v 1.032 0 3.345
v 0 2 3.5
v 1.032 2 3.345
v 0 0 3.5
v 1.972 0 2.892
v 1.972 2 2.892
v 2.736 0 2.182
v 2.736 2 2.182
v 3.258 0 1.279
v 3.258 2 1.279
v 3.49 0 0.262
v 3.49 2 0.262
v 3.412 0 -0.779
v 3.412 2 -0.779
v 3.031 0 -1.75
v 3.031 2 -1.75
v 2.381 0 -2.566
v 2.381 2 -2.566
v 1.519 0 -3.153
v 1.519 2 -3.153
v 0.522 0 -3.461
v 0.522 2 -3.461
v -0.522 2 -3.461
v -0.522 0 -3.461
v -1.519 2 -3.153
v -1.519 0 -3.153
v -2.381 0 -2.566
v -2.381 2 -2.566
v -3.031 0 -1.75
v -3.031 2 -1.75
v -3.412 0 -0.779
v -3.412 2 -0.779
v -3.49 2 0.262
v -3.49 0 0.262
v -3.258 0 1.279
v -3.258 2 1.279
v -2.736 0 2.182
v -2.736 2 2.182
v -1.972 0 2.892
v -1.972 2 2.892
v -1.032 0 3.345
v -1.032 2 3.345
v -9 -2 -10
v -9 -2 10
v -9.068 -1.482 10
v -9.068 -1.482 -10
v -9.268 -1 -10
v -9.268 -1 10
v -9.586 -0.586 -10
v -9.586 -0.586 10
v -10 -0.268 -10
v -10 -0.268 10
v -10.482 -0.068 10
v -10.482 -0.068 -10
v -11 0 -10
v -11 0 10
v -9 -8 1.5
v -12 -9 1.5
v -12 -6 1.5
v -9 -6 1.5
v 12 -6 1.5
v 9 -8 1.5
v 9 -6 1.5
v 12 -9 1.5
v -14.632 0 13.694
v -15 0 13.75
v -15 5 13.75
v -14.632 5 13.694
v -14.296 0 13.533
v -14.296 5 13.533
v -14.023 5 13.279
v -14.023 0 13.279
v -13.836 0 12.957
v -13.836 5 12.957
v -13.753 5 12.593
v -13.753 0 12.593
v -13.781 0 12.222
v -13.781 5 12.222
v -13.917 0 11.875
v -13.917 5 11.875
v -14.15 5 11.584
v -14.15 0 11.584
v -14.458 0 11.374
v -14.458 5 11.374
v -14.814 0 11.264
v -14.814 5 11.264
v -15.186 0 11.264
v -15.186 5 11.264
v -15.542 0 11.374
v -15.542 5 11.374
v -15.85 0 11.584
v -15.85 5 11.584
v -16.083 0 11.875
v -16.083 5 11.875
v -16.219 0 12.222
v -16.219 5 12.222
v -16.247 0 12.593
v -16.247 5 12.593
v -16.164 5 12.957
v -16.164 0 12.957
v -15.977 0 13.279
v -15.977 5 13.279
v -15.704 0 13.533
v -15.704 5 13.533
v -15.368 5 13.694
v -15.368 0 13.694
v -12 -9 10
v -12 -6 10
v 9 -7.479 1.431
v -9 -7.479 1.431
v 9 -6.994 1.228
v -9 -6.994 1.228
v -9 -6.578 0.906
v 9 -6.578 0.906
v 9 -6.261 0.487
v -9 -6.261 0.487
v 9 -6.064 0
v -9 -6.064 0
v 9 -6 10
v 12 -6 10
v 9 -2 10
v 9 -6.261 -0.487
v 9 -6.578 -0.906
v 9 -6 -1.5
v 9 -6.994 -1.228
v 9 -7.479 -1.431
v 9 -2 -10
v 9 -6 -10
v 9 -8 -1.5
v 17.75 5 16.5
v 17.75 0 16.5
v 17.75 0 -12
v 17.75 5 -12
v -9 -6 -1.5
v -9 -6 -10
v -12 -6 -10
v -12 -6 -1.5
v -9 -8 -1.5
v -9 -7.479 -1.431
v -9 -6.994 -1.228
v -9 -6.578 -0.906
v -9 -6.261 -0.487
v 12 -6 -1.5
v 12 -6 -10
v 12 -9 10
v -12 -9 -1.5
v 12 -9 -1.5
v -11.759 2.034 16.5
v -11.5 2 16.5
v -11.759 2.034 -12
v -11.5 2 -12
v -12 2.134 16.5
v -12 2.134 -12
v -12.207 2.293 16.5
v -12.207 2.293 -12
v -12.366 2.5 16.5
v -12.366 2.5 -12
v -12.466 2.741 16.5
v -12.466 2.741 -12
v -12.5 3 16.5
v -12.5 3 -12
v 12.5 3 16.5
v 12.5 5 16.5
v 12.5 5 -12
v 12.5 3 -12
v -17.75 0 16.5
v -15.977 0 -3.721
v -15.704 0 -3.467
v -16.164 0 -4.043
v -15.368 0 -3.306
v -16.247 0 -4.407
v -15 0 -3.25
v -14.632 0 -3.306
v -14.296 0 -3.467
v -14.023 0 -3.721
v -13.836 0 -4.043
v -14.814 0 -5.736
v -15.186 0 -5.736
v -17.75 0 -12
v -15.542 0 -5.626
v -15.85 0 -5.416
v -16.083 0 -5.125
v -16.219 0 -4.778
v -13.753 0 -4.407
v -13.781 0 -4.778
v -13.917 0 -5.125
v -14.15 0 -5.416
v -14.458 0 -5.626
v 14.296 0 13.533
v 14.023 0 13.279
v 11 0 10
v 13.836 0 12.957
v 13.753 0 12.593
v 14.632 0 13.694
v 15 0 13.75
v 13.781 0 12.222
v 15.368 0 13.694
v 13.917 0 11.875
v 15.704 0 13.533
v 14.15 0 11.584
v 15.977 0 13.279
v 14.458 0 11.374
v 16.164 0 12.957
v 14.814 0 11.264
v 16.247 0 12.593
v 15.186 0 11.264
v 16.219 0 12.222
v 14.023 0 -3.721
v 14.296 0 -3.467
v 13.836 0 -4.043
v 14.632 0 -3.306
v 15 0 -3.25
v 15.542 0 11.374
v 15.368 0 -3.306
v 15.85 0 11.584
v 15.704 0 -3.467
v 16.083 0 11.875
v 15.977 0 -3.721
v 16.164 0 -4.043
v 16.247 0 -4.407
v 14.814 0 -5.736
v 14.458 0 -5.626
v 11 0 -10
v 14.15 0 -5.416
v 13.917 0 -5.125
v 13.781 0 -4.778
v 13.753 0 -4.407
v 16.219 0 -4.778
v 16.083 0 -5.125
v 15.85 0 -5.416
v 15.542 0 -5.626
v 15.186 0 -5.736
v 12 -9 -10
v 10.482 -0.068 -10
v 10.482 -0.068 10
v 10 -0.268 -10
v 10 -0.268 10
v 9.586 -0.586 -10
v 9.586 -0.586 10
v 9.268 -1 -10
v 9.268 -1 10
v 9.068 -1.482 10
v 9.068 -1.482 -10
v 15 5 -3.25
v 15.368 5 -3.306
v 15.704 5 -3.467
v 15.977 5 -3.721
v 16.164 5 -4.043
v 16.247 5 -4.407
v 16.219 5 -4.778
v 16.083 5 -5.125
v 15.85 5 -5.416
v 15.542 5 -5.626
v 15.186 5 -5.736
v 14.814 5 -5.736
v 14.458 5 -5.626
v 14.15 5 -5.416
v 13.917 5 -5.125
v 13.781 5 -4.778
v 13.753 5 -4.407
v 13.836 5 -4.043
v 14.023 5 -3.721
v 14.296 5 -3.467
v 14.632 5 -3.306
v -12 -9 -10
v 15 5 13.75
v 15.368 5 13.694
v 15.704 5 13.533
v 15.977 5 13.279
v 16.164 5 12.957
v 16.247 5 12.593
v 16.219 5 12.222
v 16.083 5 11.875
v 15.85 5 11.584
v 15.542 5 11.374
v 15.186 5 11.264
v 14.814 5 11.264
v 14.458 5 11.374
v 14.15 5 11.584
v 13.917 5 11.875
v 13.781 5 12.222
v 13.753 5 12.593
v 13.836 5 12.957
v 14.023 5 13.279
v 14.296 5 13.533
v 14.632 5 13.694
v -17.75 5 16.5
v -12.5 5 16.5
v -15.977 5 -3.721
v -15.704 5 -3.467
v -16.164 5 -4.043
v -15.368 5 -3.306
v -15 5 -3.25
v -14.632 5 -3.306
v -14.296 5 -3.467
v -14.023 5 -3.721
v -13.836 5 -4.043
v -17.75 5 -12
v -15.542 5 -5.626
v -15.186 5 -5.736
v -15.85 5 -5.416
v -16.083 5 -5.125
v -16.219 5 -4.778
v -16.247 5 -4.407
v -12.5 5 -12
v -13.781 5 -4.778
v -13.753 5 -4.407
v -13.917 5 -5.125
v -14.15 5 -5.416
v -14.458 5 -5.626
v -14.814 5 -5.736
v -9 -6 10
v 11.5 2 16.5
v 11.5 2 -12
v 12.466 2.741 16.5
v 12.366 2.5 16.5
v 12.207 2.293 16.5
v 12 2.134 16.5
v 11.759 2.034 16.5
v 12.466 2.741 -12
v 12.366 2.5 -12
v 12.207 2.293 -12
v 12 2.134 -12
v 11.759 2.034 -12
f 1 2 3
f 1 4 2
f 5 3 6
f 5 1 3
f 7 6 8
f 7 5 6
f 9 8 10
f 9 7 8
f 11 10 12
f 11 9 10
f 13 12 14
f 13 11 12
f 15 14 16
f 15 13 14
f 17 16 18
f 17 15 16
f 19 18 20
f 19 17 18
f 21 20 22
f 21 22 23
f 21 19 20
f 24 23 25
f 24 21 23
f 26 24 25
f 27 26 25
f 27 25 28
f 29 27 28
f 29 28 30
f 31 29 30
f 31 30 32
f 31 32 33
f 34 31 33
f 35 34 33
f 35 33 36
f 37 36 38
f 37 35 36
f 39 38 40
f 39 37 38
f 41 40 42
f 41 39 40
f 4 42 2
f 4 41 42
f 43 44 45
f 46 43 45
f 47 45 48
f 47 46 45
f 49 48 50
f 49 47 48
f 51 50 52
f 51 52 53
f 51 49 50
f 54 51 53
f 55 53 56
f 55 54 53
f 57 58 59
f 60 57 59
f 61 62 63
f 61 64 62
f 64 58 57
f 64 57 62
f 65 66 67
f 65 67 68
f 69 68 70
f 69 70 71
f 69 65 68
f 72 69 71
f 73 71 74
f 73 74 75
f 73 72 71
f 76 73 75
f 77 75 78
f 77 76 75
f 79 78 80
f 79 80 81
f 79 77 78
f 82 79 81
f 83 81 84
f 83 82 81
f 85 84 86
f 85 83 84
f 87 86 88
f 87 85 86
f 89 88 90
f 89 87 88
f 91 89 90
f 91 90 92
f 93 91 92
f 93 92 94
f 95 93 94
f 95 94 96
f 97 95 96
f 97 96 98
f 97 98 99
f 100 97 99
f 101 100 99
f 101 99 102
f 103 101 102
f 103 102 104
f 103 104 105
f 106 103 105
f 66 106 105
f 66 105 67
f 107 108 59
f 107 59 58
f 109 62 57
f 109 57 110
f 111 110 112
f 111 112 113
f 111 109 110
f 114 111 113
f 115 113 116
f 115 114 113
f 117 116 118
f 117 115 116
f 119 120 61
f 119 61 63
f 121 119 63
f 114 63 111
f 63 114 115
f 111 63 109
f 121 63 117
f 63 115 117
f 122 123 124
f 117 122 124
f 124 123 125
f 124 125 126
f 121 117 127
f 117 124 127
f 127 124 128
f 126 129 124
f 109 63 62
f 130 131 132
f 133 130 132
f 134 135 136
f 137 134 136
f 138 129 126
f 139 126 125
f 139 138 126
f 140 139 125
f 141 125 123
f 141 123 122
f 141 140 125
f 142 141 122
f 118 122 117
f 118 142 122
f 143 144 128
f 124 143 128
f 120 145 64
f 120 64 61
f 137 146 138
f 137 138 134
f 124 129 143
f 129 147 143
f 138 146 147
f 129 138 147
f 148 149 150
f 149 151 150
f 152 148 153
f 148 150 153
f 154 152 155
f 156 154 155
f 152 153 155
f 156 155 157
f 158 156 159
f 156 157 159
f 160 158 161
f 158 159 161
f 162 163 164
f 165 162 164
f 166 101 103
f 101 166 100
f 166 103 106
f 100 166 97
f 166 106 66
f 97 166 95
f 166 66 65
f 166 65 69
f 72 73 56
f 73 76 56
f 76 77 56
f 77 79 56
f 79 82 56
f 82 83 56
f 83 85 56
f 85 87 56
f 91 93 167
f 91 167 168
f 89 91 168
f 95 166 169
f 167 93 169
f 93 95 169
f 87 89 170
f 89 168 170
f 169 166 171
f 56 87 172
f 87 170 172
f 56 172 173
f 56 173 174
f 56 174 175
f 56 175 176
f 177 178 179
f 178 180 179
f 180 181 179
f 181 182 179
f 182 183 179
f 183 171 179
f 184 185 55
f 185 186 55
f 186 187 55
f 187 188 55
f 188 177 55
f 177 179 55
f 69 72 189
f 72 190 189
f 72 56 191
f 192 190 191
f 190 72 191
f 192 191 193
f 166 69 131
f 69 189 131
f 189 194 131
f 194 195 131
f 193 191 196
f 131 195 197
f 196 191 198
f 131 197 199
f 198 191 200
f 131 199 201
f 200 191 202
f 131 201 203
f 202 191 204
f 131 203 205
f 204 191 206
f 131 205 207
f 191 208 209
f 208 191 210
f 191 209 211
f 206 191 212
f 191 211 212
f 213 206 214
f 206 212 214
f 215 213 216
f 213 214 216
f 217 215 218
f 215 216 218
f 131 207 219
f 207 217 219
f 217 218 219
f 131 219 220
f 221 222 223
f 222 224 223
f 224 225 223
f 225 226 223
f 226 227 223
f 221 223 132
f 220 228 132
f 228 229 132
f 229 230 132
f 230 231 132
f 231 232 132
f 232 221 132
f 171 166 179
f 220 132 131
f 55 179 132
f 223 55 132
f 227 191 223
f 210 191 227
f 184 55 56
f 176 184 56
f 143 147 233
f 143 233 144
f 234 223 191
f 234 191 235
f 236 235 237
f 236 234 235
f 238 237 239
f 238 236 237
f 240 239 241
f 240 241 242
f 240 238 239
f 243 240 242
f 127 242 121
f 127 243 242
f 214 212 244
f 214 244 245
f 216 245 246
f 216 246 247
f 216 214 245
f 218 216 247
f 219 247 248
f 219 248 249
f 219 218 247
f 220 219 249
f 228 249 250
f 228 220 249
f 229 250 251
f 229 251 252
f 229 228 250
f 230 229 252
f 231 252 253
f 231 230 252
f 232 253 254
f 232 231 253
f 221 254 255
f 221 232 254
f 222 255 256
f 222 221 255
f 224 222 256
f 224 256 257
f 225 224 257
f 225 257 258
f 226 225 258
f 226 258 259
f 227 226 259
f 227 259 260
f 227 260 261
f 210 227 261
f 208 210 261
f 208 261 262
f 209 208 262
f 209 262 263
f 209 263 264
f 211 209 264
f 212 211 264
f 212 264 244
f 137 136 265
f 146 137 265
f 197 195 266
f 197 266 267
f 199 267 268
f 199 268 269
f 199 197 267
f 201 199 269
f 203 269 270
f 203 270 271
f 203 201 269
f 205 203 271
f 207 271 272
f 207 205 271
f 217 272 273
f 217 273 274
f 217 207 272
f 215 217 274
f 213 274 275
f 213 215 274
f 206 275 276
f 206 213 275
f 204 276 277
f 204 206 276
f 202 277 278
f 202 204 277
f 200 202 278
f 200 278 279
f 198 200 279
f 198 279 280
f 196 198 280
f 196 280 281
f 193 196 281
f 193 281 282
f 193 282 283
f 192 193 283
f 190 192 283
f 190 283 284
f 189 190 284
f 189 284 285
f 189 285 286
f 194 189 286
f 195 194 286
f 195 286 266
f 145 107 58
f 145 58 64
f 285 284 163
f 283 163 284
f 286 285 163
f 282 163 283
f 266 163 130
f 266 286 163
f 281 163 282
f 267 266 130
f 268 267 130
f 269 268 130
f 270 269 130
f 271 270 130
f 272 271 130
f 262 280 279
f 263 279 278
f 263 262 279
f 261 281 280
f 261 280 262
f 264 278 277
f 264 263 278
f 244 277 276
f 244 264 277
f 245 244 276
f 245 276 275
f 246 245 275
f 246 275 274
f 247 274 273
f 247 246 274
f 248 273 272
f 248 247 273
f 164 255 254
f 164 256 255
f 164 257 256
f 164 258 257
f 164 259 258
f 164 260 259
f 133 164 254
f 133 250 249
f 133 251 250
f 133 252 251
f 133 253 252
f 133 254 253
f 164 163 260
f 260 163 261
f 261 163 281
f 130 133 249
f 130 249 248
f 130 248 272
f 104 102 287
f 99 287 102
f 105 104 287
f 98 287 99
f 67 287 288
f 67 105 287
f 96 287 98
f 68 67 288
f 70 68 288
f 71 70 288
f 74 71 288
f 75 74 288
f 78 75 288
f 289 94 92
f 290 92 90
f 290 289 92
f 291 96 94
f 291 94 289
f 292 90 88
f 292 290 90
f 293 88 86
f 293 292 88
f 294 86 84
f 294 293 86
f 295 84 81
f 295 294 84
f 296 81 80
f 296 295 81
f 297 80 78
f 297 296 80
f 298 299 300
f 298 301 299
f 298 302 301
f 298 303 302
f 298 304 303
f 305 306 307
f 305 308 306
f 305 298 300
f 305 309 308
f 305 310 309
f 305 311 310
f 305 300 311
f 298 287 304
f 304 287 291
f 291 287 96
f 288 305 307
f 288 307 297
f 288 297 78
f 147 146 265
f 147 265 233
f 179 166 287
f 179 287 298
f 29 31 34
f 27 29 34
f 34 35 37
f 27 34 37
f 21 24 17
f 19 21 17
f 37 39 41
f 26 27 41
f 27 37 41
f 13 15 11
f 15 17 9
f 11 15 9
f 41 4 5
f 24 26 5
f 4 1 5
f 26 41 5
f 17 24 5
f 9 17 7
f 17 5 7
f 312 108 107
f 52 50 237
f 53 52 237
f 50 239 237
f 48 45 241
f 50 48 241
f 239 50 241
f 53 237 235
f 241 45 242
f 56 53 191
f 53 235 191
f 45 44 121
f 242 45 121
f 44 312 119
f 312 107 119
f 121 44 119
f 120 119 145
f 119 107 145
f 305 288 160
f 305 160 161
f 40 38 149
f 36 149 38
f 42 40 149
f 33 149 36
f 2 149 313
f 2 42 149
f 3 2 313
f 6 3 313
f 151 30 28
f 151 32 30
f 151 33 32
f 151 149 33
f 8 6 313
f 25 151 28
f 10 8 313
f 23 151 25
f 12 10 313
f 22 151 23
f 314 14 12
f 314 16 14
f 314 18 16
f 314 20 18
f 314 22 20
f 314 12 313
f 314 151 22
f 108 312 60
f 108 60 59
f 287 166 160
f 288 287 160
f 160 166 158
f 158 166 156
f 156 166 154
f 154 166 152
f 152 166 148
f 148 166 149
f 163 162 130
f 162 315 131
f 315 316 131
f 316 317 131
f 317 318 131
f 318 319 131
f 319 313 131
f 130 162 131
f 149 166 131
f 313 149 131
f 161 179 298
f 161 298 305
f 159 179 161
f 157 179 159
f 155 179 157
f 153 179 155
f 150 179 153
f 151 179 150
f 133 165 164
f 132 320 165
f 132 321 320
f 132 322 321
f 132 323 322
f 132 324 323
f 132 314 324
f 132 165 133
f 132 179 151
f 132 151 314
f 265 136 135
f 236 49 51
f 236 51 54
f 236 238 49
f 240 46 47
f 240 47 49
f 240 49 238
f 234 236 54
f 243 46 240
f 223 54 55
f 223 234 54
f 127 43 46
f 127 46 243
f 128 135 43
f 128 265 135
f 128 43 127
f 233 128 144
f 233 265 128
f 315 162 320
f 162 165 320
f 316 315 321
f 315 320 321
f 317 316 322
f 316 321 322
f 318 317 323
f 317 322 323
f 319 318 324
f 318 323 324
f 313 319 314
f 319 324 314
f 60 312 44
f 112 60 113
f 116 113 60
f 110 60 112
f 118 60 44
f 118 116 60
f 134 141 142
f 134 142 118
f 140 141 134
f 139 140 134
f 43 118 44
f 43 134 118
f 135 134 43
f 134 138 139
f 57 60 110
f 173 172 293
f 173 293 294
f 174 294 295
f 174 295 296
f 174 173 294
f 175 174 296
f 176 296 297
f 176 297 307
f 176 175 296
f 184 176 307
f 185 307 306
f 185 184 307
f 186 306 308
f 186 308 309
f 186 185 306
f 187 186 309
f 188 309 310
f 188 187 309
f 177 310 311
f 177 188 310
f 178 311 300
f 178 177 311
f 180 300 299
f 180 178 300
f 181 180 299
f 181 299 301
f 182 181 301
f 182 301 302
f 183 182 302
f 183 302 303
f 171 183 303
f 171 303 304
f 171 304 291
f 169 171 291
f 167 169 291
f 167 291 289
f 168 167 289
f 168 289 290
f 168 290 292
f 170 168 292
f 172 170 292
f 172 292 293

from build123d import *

# Parameters (mm, degrees)
SKETCH1_W               = 35.5
SKETCH1_H               = 28.5
SKETCH1_R               = 1.25
BOSS_EXTRUDE1_DEPTH     = 5
SKETCH2_W               = 25
SKETCH2_H               = 28.5
SKETCH2_R               = 3.5
CUT_EXTRUDE1_DEPTH      = 3
CUT_EXTRUDE2_DEPTH      = 25.74494898
CUT_EXTRUDE2_DEPTH_BACK = 25.74494898
SKETCH3_R               = 3.5
FILLET1_R               = 1
SKETCH4_W               = 30
SKETCH4_H               = 20
BOSS_EXTRUDE5_DEPTH     = 9
CUT_EXTRUDE7_DEPTH      = 34.14079812
CUT_EXTRUDE7_DEPTH_BACK = 34.14079812
CUT_EXTRUDE8_DEPTH      = 36.189664676
CUT_EXTRUDE8_DEPTH_BACK = 36.189664676
SKETCH8_W               = 3
SKETCH8_H               = 3
FILLET2_R               = 2


with BuildPart() as part:
    # Sketch1 → Boss-Extrude1 (new body)
    with BuildSketch(Plane(origin=(0, 0, 0), x_dir=(1, 0, 0), z_dir=(0, 1, 0))):
        with Locations((0, -2.25)):
            Rectangle(SKETCH1_W, SKETCH1_H)
        with Locations(Location((-15, 4.5, 0), (0, 0, 270))):
            Circle(SKETCH1_R, mode=Mode.SUBTRACT)
        with Locations(Location((15, 4.5, 0), (0, 0, 270))):
            Circle(SKETCH1_R, mode=Mode.SUBTRACT)
        with Locations(Location((-15, -12.5, 0), (0, 0, 270))):
            Circle(SKETCH1_R, mode=Mode.SUBTRACT)
        with Locations(Location((15, -12.5, 0), (0, 0, 270))):
            Circle(SKETCH1_R, mode=Mode.SUBTRACT)
    extrude(amount=BOSS_EXTRUDE1_DEPTH)

    # Sketch2 → Cut-Extrude1 (cut)
    with BuildSketch(Plane(origin=(0, 5, 0), x_dir=(1, 0, 0), z_dir=(0, 1, 0))):
        with Locations((0, -2.25)):
            Rectangle(SKETCH2_W, SKETCH2_H)
        with Locations(Location((0, 0, 0), (0, 0, 270))):
            Circle(SKETCH2_R, mode=Mode.SUBTRACT)
    extrude(amount=-CUT_EXTRUDE1_DEPTH, mode=Mode.SUBTRACT)

    # Sketch3 → Cut-Extrude2 (cut, two sides: drawn at the far end of the back side and taken through both)
    with BuildSketch(Plane(origin=(0, 5, 0), x_dir=(1, 0, 0), z_dir=(0, 1, 0)).offset(-CUT_EXTRUDE2_DEPTH_BACK)):
        with Locations(Location((0, 0, 0), (0, 0, 270))):
            Circle(SKETCH3_R)
    extrude(amount=CUT_EXTRUDE2_DEPTH + CUT_EXTRUDE2_DEPTH_BACK, mode=Mode.SUBTRACT)

    # Fillet1
    fillet1_edges = [part.edges().sort_by_distance(p)[0] for p in [
        (12.5, 2, 2.25),
        (-12.5, 2, 2.25),
    ]]
    fillet(fillet1_edges, radius=FILLET1_R)

    # Sketch4 → Boss-Extrude5 (add)
    with BuildSketch(Plane.XZ):
        Rectangle(SKETCH4_W, SKETCH4_H)
    extrude(amount=BOSS_EXTRUDE5_DEPTH)

    # Sketch7 → Cut-Extrude7 (cut, two sides: drawn at the far end of the back side and taken through both)
    with BuildSketch(Plane(origin=(0, 0, -10), x_dir=(-1, 0, 0), z_dir=(0, 0, -1)).offset(-CUT_EXTRUDE7_DEPTH_BACK)):
        Polygon((12, -6), (12, -9), (15, -9), (15, 0), (9, 0), (9, -6), align=None)
        Polygon((-15, -9), (-12, -9), (-12, -6), (-9, -6), (-9, 0), (-15, 0), align=None)
    extrude(amount=CUT_EXTRUDE7_DEPTH + CUT_EXTRUDE7_DEPTH_BACK, mode=Mode.SUBTRACT)

    # Sketch8 → Cut-Extrude8 (cut, two sides: drawn at the far end of the back side and taken through both)
    with BuildSketch(Plane.ZY.offset(12).offset(-CUT_EXTRUDE8_DEPTH_BACK)):
        with Locations((0, -7.5)):
            Rectangle(SKETCH8_W, SKETCH8_H)
    extrude(amount=CUT_EXTRUDE8_DEPTH + CUT_EXTRUDE8_DEPTH_BACK, mode=Mode.SUBTRACT)

    # Fillet2
    # the kernel refuses this fillet: 2 mm, written as the material it adds along each edge
    with BuildSketch(Plane(origin=(9, 0, -10), x_dir=(1, 0, 0), z_dir=(0, 0, 1))) as fillet2_piece_1:
        with BuildLine():
            CenterArc((FILLET2_R, -FILLET2_R), FILLET2_R, 90, 90)
            Line((0, -FILLET2_R), (0, 0))
            Line((0, 0), (FILLET2_R, 0))
        make_face()
    extrude(amount=20)
    with BuildSketch(Plane(origin=(-9, 0, -10), x_dir=(-1, 0, 0), z_dir=(0, 0, 1))) as fillet2_piece_2:
        with BuildLine():
            CenterArc((FILLET2_R, FILLET2_R), FILLET2_R, 180, 90)
            Line((0, FILLET2_R), (0, 0))
            Line((0, 0), (FILLET2_R, 0))
        make_face()
    extrude(amount=20)
    with BuildSketch(Plane(origin=(-9, -6, -1.5), x_dir=(0, 0, 1), z_dir=(1, 0, 0)), Plane(origin=(9, -6, 1.5), x_dir=(0, 0, -1), z_dir=(-1, 0, 0))) as fillet2_piece_3:
        with BuildLine():
            CenterArc((FILLET2_R, FILLET2_R), FILLET2_R, 180, 90)
            Line((0, FILLET2_R), (0, 0))
            Line((0, 0), (FILLET2_R, 0))
        make_face()
    extrude(amount=18)


solid = part.part
